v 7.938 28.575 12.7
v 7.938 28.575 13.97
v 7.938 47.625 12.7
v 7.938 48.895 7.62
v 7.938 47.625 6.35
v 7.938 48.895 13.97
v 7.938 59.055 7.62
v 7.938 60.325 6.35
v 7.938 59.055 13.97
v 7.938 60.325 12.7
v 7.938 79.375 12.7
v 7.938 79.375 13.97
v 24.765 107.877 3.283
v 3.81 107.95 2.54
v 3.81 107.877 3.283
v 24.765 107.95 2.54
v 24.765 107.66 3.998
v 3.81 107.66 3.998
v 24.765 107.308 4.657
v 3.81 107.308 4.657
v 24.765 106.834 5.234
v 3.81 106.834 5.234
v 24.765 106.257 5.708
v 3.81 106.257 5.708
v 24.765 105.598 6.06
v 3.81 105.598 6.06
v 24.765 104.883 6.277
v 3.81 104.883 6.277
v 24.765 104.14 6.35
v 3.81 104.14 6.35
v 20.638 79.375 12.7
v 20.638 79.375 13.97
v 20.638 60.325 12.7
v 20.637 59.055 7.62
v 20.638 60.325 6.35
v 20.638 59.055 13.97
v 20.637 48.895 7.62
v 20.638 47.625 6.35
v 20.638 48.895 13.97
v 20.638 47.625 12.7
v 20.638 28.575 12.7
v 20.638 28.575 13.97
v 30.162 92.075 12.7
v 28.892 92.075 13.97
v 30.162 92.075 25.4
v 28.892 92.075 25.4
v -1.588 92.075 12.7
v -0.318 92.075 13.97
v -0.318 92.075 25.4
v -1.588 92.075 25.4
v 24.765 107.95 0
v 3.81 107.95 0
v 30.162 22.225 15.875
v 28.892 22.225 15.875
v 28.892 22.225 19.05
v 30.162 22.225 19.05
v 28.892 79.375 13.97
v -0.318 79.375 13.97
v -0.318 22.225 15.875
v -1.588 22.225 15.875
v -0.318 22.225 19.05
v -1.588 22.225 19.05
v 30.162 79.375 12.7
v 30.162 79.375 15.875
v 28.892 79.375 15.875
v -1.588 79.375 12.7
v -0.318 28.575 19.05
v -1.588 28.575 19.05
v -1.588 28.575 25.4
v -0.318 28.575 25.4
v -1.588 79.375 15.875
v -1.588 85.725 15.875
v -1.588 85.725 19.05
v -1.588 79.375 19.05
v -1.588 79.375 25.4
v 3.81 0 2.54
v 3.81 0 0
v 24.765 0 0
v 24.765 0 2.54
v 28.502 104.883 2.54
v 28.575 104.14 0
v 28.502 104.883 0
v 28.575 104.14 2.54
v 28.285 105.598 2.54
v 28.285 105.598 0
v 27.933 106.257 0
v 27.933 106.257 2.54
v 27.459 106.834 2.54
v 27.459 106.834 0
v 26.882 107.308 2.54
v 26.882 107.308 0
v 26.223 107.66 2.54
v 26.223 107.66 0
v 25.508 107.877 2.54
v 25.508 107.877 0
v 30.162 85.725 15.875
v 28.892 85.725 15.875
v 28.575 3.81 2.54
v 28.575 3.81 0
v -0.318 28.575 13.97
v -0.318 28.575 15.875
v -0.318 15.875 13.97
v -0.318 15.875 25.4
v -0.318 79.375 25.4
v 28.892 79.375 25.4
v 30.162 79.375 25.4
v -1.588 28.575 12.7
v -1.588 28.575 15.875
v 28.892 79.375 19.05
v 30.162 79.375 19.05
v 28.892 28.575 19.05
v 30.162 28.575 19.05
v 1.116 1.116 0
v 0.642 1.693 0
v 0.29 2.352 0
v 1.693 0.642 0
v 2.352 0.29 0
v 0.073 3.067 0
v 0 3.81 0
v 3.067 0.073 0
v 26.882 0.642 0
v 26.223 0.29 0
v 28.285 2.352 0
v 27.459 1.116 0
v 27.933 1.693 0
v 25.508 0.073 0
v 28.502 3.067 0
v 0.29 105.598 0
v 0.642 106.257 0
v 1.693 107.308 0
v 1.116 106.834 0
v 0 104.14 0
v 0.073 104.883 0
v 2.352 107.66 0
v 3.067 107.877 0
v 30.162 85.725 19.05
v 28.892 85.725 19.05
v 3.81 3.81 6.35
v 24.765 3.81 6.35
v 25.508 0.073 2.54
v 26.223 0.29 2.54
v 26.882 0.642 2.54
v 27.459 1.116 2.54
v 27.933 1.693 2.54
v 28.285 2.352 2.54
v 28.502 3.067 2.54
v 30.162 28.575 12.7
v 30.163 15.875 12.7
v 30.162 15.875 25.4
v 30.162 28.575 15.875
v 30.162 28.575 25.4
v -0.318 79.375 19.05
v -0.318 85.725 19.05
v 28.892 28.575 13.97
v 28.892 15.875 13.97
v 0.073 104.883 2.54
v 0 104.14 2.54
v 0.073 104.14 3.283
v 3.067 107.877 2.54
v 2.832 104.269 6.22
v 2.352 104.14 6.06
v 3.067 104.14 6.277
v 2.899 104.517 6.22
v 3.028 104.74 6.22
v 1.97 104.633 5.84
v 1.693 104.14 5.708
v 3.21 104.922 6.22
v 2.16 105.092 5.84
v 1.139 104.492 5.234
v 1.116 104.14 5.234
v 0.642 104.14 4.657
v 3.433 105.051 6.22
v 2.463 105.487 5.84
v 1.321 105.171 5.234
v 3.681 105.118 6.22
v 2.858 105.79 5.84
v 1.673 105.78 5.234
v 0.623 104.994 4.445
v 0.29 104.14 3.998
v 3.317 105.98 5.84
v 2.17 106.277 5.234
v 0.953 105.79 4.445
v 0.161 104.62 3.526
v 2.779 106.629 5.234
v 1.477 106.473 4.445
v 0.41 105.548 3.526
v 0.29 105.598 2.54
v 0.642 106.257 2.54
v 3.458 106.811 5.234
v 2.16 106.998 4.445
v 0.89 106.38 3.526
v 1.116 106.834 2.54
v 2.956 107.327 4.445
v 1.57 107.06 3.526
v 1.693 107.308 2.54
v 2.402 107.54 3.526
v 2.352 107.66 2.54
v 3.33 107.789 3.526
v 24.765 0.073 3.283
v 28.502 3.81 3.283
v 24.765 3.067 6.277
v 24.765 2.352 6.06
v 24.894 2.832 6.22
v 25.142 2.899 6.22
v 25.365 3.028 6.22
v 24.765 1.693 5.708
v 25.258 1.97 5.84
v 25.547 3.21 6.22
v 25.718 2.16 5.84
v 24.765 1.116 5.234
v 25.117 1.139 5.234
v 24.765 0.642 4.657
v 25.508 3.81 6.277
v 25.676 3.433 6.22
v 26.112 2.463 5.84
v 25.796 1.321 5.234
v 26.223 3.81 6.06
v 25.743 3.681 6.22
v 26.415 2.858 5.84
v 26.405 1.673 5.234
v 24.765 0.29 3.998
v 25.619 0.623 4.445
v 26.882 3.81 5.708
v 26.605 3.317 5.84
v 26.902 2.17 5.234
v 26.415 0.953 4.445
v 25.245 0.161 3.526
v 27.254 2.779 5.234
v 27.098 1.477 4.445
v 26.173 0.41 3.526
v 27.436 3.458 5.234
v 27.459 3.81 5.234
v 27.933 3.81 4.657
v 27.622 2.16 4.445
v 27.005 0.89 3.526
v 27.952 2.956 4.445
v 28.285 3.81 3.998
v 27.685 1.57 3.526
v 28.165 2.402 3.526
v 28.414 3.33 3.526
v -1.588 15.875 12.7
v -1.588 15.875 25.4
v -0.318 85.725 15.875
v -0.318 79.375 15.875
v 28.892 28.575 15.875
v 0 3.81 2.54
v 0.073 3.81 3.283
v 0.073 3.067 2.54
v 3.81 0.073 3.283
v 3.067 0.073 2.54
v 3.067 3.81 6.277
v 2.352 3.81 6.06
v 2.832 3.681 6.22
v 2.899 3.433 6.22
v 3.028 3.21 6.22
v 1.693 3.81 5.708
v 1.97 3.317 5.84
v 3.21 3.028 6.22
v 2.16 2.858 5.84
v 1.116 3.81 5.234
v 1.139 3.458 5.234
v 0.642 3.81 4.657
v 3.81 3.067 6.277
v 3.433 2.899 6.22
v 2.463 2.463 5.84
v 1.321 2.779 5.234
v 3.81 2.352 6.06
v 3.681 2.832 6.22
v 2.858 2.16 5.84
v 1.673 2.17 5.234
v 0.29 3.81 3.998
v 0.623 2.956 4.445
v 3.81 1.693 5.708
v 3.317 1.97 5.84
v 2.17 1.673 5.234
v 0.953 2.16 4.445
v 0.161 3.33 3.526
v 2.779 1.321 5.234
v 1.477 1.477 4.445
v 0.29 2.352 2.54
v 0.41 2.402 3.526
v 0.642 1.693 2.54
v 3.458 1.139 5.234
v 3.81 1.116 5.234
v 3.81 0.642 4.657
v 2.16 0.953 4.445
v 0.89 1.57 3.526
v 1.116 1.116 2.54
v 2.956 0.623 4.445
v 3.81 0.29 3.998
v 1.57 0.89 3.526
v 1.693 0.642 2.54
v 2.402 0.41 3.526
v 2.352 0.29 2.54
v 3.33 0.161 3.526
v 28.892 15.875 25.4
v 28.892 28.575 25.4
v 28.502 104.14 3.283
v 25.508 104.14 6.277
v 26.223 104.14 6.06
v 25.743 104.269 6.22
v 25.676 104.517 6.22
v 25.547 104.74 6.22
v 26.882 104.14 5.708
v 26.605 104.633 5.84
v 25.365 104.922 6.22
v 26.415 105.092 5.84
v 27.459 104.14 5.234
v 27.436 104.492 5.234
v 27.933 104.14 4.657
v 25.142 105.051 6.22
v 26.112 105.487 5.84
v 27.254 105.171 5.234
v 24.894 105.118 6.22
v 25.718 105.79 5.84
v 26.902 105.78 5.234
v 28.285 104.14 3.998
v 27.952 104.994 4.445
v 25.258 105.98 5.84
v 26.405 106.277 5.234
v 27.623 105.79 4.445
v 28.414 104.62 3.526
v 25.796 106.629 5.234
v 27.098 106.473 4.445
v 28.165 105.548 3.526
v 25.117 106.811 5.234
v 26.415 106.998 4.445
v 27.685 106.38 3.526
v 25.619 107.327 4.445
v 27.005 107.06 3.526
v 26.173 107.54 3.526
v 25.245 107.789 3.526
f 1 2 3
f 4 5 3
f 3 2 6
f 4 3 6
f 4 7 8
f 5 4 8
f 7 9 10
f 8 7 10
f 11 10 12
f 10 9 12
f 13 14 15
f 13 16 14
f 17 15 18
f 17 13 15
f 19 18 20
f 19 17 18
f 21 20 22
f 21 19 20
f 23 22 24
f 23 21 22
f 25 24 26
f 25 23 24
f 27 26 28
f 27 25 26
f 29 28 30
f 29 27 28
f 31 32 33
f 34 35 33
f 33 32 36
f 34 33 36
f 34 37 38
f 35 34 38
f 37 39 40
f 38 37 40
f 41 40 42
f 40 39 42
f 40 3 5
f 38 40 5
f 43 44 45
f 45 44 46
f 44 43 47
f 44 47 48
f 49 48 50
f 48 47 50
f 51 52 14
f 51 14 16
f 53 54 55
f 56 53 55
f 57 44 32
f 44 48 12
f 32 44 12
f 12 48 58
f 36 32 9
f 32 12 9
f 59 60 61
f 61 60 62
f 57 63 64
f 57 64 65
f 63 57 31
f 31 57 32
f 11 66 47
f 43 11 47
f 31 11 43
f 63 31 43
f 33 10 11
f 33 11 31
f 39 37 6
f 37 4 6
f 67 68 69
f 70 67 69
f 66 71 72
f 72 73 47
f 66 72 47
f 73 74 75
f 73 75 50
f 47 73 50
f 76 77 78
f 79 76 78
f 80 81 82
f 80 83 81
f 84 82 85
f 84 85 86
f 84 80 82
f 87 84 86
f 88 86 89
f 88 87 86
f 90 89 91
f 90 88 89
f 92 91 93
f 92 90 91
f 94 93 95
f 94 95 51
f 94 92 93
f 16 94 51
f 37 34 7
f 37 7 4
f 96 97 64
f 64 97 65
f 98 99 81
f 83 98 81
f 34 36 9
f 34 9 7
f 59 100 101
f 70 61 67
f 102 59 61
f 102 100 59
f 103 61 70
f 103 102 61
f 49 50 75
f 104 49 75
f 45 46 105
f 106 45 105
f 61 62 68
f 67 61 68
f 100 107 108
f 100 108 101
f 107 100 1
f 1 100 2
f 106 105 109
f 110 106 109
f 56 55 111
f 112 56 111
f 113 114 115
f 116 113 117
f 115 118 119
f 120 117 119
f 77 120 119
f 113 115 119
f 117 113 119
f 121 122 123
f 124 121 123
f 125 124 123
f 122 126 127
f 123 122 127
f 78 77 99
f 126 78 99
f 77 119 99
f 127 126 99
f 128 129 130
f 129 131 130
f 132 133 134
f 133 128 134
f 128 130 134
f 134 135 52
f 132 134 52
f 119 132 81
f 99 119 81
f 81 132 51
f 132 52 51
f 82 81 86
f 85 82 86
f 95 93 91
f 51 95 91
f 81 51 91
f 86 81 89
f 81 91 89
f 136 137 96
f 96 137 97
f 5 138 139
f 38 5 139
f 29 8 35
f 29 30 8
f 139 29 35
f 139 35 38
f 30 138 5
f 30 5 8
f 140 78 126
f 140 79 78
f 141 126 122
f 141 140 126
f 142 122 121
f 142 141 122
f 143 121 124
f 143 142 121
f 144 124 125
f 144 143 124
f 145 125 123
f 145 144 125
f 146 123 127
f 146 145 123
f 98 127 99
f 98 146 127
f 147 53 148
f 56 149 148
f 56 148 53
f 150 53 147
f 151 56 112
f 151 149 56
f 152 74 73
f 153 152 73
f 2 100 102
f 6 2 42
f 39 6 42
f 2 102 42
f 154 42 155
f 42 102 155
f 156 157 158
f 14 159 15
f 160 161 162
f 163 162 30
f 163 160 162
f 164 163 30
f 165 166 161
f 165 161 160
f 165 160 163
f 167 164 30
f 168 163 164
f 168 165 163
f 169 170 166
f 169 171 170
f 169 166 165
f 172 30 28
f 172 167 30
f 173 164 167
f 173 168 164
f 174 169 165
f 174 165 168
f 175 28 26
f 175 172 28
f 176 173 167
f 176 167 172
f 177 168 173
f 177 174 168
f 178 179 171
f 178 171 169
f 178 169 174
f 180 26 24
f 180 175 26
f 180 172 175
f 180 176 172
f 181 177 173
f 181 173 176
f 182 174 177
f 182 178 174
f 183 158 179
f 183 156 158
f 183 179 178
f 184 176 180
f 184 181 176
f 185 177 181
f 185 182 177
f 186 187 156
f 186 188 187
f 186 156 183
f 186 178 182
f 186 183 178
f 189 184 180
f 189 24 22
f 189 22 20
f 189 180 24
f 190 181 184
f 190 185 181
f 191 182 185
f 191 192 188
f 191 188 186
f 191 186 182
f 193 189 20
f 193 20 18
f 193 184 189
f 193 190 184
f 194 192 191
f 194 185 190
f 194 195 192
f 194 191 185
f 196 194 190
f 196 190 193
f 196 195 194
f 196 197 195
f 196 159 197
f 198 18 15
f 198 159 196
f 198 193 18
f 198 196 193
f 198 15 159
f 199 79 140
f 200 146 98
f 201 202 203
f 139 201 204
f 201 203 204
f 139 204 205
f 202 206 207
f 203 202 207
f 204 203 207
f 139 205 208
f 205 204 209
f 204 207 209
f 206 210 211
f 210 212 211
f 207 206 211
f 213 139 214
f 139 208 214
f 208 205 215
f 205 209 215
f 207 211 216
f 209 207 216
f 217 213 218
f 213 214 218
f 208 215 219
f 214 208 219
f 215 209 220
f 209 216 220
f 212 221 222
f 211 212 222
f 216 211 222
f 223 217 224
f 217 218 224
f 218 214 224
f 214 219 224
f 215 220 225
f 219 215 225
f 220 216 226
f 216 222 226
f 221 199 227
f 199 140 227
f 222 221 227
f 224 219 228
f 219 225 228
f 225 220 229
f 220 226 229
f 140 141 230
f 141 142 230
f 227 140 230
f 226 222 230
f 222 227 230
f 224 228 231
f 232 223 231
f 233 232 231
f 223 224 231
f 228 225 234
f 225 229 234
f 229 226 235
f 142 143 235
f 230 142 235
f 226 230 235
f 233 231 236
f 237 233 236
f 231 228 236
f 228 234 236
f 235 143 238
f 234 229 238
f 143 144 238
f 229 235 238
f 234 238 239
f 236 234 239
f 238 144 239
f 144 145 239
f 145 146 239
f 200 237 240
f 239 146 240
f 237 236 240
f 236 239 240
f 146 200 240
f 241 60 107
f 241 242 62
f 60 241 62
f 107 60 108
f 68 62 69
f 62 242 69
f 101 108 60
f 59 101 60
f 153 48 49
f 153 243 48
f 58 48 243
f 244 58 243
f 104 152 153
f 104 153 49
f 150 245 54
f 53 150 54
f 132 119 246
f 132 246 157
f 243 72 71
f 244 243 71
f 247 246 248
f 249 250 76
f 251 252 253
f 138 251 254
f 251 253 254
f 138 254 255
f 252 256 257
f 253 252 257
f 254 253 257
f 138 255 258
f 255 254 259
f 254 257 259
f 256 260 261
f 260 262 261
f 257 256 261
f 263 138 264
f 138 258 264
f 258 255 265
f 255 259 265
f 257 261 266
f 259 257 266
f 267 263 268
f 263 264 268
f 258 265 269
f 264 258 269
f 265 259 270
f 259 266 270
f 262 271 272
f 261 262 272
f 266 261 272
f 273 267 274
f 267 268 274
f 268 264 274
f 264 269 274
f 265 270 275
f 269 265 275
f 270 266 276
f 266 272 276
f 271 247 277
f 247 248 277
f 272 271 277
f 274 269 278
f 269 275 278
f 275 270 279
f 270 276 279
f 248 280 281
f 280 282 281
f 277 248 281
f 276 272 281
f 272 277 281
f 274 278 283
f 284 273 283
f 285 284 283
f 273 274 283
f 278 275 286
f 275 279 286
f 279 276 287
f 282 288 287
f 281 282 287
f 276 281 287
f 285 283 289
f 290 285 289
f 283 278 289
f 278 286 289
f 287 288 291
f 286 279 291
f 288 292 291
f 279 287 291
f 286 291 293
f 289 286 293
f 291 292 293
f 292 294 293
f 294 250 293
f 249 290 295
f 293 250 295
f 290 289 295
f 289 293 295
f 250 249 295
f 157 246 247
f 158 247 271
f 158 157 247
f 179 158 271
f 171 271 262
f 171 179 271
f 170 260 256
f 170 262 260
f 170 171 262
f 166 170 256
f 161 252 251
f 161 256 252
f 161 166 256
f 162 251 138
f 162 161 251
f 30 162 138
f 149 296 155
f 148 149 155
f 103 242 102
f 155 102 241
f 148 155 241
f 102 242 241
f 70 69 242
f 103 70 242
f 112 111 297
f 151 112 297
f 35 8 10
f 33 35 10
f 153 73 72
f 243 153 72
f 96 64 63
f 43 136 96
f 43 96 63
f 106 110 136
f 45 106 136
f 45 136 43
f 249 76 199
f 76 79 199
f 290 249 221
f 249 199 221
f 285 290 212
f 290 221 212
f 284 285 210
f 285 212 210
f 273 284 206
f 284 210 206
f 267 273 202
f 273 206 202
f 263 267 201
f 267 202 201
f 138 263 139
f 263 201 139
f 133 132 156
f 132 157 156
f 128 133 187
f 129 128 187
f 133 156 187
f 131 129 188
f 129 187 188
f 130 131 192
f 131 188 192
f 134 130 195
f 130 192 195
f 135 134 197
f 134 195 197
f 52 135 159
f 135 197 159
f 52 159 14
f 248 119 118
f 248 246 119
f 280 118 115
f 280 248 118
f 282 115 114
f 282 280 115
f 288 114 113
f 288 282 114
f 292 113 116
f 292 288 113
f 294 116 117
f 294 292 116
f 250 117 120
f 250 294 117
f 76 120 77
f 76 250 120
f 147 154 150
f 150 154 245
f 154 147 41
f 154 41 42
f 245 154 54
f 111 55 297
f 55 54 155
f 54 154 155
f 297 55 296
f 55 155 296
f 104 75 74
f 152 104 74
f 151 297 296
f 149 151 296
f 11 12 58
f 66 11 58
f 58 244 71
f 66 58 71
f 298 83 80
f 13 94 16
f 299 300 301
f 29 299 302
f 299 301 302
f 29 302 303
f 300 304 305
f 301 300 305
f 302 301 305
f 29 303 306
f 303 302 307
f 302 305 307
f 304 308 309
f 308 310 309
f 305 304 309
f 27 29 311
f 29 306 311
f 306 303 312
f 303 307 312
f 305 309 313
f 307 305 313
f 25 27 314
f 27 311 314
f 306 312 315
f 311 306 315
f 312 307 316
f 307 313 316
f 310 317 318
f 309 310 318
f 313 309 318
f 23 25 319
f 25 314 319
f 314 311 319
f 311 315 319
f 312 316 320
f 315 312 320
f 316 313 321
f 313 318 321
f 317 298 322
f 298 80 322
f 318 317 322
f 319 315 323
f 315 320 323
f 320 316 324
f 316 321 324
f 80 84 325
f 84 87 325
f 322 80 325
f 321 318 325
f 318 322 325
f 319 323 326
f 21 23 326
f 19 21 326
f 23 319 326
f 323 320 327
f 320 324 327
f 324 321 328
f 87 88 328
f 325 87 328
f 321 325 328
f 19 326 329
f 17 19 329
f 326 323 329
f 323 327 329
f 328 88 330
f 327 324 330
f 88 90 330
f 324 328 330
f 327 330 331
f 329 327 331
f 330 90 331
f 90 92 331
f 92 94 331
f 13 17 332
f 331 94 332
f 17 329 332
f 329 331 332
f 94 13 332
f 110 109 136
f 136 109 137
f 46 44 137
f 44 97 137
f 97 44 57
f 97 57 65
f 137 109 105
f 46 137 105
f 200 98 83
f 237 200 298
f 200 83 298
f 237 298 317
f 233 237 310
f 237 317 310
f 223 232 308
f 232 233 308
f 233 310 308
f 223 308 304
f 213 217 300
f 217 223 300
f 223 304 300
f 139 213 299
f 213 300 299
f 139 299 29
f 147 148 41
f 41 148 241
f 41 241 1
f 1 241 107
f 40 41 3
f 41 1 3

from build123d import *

# Parameters (mm, degrees)
F0_W          = 28.575
F0_H          = 107.95
F1_DEPTH      = 6.35
F2_R          = 3.81
F8_DEPTH      = 15.875
F8_DEPTH_BACK = 15.875
F9_W          = 9.525
F9_H          = 6.35
F9_W_2        = 29.21
F9_H_2        = 11.43
F10_DEPTH     = 92.076
F12_DEPTH     = 7.62


with BuildPart() as f1:
    # F0 (on Top) → F1 (new body)
    with BuildSketch(Plane.XY):
        with Locations((14.2875, 53.975)):
            Rectangle(F0_W, F0_H)
    extrude(amount=F1_DEPTH)

    # F2
    f2_edges = [f1.edges().sort_by_distance(p)[0] for p in [
        (28.575, 0, 3.175),
        (0, 0, 3.175),
        (28.575, 107.95, 3.175),
        (0, 107.95, 3.175),
        (0, 53.975, 6.35),
        (14.2875, 0, 6.35),
        (28.575, 53.975, 6.35),
        (14.2875, 107.95, 6.35),
    ]]
    fillet(f2_edges, radius=F2_R)

    # F7 (on 3pt) → F8 (join, two sides)
    with BuildSketch(Plane.YZ.offset(14.2875)) as f8_sk:
        Polygon((28.575, 25.4), (15.875, 25.4), (15.875, 12.7), (47.625, 12.7), (47.625, 6.35), (53.975, 6.35), (60.325, 6.35), (60.325, 12.7), (92.075, 12.7), (92.075, 25.4), (79.375, 25.4), (79.375, 19.05), (85.725, 19.05), (85.725, 15.875), (79.375, 15.875), (79.375, 13.97), (59.055, 13.97), (59.055, 7.62), (48.895, 7.62), (48.895, 13.97), (28.575, 13.97), (28.575, 15.875), (22.225, 15.875), (22.225, 19.05), (28.575, 19.05), align=None)
    extrude(amount=-F8_DEPTH)
    extrude(f8_sk.sketch, amount=F8_DEPTH_BACK)

    # F9 (on face) → F10 (cut, through all)
    with BuildSketch(Plane.XZ.offset(-15.875)):
        with Locations((3.175, 9.525)):
            Rectangle(F9_W, F9_H)
        with Locations((14.2875, 19.685)):
            Rectangle(F9_W_2, F9_H_2)
        with Locations((25.4, 9.525)):
            Rectangle(F9_W, F9_H)
    extrude(amount=-F10_DEPTH, mode=Mode.SUBTRACT)

    # F11 (on face) → F12 (cut, through all)
    with BuildSketch(Plane.XY.offset(13.97)):
        Polygon((7.9375, 48.895), (-1.5875, 48.895), (-1.5875, 28.575), (-0.3175, 28.575), (7.9375, 28.575), align=None)
        Polygon((-0.3175, 79.375), (-1.5875, 79.375), (-1.5875, 59.055), (7.9375, 59.055), (7.9375, 79.375), align=None)
        Polygon((30.1625, 48.895), (20.6375, 48.895), (20.6375, 28.575), (28.8925, 28.575), (30.1625, 28.575), align=None)
        Polygon((20.6375, 79.375), (20.6375, 59.055), (30.1625, 59.055), (30.1625, 79.375), (28.8925, 79.375), align=None)
    extrude(amount=-F12_DEPTH, mode=Mode.SUBTRACT)


solid = f1.part
